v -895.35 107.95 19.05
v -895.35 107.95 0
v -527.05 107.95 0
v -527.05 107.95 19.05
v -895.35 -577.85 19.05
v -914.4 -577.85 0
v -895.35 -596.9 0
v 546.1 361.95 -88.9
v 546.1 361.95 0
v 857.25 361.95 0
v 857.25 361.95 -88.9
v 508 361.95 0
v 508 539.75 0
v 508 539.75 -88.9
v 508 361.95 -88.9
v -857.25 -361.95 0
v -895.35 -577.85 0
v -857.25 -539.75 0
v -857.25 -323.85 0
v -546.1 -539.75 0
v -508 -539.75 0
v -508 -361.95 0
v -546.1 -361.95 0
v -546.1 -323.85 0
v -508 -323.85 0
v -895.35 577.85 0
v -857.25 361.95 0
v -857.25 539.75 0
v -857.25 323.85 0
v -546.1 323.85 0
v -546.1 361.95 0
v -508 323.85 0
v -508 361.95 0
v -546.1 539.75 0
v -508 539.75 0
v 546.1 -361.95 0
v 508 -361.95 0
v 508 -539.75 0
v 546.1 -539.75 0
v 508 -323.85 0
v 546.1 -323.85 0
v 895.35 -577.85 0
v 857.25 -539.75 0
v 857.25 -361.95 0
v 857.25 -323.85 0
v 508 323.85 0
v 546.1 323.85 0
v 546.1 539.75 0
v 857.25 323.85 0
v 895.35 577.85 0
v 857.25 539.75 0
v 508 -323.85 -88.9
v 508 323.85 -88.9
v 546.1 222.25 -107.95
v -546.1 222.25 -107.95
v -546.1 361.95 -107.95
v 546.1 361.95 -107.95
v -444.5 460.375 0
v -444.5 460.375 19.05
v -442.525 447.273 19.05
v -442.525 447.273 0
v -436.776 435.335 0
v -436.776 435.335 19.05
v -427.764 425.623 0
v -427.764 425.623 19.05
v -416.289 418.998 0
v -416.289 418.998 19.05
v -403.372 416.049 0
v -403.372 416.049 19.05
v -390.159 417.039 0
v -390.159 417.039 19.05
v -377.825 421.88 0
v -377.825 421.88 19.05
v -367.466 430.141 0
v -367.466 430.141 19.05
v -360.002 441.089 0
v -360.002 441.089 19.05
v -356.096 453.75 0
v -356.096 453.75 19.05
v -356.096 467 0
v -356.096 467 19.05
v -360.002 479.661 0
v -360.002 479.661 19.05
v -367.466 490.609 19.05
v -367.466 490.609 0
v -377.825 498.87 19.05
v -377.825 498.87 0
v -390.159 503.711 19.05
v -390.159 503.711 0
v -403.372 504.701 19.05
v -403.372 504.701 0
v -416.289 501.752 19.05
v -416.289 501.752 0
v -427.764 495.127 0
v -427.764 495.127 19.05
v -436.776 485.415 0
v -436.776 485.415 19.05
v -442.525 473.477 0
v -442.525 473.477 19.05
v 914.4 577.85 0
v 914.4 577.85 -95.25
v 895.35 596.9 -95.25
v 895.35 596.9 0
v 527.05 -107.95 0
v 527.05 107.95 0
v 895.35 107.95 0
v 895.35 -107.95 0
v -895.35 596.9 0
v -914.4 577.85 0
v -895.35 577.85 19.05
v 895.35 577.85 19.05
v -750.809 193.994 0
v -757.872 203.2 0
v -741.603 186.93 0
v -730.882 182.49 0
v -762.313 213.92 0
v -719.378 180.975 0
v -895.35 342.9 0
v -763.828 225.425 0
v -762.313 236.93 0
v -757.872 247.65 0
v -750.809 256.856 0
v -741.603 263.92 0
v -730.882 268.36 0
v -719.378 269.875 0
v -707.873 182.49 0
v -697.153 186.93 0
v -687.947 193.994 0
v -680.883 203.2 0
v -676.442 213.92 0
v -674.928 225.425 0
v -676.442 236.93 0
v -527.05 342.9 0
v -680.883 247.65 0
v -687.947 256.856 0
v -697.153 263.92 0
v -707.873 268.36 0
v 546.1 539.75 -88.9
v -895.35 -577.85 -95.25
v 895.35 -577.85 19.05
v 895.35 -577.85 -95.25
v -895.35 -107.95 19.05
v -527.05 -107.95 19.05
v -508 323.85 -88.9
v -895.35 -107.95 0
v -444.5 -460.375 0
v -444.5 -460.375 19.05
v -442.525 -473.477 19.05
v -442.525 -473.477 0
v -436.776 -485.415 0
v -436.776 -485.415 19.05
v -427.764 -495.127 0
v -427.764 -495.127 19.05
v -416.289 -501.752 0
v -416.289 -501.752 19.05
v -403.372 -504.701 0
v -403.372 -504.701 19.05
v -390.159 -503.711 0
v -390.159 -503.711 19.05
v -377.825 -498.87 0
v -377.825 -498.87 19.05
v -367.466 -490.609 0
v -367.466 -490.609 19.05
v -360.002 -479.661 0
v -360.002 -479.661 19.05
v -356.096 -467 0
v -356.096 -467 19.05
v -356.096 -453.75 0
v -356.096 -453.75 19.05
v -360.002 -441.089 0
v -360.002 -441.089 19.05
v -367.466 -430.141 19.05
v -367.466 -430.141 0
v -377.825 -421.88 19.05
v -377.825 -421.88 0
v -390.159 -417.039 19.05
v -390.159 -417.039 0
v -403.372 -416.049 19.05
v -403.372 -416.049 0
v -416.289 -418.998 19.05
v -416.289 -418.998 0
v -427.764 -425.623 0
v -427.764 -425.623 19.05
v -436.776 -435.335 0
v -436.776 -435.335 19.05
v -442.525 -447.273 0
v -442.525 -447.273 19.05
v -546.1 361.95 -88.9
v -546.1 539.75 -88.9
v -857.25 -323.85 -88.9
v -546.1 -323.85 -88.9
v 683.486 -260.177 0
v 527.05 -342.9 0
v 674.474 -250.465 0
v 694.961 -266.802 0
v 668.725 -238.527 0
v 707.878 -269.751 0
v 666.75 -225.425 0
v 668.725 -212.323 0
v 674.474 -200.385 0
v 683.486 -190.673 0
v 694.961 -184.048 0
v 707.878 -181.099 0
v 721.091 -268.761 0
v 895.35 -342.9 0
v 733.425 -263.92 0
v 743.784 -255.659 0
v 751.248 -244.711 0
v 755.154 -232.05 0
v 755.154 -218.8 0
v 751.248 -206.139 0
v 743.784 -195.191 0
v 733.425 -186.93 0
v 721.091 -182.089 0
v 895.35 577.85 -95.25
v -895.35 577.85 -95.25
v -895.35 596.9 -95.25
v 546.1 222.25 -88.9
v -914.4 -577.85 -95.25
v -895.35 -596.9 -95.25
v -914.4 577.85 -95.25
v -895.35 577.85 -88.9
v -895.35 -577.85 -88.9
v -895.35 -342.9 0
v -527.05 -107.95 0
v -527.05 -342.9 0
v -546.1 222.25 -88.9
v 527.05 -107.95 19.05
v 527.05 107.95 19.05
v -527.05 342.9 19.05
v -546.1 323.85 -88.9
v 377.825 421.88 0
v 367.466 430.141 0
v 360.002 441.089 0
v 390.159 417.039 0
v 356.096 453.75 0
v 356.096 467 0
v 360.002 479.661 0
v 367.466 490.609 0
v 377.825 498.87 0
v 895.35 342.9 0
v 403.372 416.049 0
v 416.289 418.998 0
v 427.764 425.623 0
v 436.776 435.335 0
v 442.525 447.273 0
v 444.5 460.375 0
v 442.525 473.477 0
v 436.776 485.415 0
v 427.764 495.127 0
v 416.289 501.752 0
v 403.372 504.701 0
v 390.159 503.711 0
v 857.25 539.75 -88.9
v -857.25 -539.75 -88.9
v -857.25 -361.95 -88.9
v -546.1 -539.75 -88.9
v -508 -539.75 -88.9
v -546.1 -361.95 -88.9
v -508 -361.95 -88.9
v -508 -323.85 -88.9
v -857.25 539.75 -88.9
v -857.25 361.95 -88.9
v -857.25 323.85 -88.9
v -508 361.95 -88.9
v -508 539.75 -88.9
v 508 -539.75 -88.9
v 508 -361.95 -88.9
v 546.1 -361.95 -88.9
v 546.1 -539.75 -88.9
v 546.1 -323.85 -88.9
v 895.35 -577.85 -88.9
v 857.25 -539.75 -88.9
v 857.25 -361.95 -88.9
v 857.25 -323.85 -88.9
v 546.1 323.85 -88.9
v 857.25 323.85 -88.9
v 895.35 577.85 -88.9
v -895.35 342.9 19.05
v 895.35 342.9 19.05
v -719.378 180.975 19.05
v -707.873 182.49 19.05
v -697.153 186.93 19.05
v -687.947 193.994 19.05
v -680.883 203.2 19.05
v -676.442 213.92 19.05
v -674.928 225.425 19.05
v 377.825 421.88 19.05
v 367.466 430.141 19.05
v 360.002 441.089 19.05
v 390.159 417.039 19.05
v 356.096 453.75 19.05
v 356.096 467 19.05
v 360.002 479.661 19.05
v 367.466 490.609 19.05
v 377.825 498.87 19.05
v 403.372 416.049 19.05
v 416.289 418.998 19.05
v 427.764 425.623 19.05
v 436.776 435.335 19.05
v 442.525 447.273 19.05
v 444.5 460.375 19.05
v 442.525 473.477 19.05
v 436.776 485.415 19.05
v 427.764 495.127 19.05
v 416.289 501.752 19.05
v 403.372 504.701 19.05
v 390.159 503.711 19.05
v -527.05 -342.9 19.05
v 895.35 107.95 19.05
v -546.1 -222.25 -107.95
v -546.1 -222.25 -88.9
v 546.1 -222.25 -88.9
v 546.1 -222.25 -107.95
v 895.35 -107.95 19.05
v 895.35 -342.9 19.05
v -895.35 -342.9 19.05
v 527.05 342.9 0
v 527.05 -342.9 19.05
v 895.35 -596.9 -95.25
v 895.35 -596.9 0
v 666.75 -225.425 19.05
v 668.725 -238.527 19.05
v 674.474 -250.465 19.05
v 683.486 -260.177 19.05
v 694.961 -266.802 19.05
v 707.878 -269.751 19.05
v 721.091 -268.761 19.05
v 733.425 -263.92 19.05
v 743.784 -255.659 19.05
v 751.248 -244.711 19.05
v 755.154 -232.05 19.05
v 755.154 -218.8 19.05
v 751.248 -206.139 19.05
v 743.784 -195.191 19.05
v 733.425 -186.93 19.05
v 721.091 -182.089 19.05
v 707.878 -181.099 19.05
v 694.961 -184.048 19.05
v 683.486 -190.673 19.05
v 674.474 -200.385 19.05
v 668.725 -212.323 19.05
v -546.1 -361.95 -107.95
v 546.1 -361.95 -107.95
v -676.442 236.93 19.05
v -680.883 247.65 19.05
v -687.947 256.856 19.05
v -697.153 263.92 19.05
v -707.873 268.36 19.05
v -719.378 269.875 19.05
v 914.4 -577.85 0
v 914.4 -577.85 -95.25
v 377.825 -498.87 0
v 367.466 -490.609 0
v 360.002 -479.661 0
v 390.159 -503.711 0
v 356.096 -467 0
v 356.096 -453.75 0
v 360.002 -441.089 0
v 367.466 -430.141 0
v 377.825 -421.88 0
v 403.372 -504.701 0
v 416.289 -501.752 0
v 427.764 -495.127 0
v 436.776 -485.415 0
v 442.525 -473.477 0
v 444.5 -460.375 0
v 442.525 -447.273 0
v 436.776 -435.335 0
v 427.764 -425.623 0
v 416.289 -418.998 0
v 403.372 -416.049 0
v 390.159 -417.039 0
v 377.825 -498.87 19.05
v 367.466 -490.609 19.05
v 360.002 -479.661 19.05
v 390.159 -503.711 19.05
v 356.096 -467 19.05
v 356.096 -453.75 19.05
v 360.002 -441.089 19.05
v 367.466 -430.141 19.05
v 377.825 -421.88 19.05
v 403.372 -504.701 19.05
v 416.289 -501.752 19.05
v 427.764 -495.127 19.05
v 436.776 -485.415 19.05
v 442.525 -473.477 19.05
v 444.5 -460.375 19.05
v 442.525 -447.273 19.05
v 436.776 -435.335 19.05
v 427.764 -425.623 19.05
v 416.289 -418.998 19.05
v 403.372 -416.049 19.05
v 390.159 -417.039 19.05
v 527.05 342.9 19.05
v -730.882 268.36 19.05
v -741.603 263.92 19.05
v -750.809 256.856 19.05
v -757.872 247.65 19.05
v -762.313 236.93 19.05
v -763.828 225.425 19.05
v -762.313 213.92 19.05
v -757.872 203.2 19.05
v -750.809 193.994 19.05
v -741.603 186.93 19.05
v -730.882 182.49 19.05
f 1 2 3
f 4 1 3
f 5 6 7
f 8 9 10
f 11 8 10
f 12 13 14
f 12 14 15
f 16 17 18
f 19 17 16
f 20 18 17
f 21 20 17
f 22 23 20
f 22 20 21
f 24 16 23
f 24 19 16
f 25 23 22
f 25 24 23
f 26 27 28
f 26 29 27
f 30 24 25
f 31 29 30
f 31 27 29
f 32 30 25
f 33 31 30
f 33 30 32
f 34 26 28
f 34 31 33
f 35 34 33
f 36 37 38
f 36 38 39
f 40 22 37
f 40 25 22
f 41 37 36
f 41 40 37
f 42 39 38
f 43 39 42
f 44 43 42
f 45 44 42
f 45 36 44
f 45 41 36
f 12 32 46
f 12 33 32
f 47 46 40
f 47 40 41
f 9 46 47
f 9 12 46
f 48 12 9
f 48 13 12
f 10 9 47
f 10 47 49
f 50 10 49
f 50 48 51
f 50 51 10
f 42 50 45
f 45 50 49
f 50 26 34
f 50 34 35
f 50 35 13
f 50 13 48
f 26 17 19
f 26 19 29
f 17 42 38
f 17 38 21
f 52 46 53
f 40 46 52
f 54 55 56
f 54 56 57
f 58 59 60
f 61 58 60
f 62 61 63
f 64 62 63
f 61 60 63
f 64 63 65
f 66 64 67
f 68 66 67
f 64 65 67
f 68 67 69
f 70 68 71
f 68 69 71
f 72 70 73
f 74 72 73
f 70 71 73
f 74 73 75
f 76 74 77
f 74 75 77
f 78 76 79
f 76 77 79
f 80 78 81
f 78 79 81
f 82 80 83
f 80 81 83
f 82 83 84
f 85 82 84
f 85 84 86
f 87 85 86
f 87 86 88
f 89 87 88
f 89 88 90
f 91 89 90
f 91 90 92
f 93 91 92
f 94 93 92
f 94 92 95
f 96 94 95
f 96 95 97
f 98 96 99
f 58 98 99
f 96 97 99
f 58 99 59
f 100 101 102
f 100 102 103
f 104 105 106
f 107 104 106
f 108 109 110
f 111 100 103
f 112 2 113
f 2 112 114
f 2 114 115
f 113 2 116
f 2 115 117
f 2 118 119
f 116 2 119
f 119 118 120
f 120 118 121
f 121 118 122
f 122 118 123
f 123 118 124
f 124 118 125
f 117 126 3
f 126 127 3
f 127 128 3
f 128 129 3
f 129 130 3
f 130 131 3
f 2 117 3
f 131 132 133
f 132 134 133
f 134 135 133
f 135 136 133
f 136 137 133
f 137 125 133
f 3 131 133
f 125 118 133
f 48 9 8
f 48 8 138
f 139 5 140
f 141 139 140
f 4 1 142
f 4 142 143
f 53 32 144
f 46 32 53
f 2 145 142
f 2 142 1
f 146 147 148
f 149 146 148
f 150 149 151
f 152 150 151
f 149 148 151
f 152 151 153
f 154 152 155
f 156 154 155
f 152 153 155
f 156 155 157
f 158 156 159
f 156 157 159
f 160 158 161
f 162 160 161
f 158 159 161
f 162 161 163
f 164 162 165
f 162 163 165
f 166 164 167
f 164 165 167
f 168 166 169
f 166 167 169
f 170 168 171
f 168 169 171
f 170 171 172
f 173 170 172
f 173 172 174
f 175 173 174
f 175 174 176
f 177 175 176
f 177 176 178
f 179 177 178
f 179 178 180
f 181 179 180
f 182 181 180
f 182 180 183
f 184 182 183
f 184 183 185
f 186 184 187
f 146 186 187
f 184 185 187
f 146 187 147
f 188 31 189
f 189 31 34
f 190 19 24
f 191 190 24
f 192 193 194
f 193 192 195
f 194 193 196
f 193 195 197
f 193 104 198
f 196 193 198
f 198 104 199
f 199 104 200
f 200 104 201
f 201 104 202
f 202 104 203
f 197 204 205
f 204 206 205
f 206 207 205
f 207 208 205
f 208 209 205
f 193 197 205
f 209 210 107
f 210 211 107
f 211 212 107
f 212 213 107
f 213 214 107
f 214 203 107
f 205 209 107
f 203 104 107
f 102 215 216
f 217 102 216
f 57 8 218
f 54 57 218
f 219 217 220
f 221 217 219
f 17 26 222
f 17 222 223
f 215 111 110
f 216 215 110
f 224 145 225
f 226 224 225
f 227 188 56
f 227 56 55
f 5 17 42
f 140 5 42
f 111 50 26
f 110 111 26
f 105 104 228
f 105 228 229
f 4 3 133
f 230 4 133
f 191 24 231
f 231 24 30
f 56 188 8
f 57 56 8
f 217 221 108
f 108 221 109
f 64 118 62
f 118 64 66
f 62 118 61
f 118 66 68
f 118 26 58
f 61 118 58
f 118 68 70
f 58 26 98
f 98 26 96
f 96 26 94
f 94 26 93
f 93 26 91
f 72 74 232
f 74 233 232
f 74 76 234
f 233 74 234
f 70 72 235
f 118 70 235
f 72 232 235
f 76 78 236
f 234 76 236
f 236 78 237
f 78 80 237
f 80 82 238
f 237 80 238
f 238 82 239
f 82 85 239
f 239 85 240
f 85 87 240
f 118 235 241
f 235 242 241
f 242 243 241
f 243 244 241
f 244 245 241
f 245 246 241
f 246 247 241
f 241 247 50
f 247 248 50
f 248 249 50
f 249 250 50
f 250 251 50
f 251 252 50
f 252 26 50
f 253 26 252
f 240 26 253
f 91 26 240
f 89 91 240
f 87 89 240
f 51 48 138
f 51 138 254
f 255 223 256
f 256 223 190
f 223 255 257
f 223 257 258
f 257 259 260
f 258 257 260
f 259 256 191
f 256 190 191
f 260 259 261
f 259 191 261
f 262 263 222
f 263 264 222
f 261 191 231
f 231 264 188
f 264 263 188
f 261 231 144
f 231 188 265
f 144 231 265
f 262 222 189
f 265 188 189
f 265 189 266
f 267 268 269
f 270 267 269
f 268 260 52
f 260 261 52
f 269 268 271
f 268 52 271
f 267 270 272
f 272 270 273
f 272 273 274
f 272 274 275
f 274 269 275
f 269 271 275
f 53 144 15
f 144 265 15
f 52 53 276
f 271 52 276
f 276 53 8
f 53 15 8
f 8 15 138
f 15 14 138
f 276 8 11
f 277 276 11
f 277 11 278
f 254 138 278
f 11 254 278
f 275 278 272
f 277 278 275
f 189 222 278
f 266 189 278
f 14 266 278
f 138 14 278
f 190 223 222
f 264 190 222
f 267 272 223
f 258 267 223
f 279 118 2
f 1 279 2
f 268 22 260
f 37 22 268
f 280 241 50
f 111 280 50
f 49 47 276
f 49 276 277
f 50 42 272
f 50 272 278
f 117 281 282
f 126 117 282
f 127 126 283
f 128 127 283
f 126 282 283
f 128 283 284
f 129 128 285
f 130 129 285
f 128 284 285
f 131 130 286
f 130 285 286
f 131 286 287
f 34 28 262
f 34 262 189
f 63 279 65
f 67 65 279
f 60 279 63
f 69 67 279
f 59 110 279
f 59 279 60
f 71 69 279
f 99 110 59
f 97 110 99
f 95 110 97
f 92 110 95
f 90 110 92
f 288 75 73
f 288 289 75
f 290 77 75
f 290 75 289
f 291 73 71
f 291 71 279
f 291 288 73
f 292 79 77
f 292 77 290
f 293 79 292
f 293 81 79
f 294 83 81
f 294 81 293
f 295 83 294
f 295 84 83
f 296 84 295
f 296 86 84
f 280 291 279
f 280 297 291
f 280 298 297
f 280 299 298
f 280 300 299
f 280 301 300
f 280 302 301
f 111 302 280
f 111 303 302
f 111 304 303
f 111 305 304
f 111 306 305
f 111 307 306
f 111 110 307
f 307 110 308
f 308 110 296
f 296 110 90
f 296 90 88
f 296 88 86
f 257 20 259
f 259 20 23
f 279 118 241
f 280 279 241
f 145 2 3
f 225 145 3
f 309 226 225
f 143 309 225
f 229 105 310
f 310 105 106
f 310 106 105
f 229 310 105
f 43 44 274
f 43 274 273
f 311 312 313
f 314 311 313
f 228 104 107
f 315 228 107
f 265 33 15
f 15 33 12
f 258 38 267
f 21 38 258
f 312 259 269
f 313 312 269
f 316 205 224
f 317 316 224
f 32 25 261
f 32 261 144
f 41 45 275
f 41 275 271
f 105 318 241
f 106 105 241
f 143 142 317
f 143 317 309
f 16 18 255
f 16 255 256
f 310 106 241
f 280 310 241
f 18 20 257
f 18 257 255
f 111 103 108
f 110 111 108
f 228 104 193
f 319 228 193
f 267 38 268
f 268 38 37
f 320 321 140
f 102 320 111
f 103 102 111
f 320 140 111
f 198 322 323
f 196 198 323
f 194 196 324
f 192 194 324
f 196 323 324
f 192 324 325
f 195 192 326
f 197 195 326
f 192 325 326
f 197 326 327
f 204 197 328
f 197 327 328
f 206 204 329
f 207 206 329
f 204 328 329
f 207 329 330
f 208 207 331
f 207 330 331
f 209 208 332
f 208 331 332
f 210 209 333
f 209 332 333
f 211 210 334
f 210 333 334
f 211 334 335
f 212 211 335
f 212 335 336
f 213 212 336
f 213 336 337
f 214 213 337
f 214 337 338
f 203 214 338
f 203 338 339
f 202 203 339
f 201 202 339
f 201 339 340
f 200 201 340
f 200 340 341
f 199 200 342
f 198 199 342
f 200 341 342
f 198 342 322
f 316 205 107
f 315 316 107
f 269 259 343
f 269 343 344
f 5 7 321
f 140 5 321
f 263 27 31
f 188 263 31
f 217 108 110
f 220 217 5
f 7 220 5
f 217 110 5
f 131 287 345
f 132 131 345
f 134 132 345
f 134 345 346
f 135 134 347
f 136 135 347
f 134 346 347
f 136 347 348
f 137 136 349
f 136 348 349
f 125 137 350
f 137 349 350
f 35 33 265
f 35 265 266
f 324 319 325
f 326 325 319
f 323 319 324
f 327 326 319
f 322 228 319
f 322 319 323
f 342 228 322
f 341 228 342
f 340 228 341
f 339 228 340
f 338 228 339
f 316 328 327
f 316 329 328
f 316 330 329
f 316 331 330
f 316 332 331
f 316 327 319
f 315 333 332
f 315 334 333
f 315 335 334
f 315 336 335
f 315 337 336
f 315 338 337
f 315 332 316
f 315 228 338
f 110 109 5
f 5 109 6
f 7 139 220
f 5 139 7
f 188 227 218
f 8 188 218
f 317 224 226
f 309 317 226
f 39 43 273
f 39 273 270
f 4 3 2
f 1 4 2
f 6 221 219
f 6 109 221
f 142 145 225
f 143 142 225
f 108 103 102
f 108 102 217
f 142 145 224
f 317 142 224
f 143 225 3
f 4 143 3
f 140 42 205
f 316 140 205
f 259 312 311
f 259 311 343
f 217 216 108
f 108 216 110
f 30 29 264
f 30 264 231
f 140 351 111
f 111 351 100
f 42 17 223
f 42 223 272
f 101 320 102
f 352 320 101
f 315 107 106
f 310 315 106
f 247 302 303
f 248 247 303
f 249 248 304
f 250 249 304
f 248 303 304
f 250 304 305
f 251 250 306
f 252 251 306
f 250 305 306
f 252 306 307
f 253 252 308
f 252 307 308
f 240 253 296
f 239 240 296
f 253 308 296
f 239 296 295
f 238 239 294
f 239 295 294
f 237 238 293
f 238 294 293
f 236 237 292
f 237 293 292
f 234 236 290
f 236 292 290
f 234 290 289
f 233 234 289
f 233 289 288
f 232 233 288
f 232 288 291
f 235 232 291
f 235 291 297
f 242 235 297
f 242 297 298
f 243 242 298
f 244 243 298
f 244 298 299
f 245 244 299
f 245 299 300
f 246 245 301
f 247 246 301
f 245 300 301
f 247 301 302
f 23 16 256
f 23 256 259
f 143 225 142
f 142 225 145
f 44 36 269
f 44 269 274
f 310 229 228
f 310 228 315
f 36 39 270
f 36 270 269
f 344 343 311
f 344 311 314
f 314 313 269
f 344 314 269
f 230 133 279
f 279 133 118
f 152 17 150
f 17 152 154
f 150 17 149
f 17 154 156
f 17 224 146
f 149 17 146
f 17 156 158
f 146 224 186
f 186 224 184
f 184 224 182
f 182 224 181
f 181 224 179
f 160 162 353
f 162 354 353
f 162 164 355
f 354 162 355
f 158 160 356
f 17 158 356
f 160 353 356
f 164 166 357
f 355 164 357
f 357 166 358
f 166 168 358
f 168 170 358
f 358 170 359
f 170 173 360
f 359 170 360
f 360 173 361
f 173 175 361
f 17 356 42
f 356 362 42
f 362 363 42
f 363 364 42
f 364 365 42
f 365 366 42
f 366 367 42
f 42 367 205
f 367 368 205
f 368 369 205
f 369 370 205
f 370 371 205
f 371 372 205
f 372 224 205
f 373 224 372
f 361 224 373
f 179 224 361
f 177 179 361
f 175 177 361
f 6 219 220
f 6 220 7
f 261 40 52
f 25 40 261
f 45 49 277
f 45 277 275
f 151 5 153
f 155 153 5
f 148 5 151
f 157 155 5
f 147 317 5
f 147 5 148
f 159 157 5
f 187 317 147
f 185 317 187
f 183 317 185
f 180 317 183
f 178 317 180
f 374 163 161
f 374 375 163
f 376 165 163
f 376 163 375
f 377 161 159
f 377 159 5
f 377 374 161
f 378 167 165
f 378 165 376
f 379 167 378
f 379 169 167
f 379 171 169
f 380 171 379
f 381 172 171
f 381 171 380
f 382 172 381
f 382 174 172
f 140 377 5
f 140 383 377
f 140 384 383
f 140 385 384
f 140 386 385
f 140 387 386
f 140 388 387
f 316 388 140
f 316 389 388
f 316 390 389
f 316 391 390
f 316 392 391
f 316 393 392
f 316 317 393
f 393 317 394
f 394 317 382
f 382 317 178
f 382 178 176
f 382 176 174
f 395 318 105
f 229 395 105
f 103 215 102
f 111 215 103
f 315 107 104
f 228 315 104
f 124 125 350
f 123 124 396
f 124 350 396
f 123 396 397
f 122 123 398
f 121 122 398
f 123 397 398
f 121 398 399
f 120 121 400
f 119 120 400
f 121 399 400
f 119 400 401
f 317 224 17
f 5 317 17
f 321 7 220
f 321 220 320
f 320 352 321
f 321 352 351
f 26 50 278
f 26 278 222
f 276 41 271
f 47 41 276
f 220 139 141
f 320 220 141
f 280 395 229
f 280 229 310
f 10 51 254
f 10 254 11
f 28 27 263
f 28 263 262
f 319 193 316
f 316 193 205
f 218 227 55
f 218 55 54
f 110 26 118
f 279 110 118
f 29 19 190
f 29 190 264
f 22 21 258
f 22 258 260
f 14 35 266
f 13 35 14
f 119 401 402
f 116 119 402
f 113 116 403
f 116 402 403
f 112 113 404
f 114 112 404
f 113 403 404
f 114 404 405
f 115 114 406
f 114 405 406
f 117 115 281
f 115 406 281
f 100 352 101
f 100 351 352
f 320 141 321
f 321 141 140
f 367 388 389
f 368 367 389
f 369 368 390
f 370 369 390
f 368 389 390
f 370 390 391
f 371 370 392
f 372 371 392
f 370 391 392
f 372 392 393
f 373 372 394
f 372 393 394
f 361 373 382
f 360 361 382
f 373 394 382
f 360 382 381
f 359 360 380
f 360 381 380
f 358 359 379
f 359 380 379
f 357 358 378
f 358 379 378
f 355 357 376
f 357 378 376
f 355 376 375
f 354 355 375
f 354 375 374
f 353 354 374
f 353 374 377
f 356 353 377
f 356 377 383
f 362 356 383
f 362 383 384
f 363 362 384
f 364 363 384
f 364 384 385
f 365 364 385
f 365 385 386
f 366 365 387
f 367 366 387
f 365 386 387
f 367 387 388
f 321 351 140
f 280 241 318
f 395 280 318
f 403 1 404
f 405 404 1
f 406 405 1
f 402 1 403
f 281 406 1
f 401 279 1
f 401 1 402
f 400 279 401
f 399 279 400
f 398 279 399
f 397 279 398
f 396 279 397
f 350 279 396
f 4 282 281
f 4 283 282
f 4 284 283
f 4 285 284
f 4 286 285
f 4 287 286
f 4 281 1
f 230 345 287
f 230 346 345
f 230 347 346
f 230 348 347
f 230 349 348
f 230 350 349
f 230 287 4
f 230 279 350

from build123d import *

# Parameters (mm, degrees)
F0_W       = 38.1
F0_H       = 38.1
F0_W_2     = 1016
F0_H_2     = 647.7
F0_W_3     = 311.15
F0_H_3     = 177.8
F1_DEPTH   = 88.9
F2_W       = 311.15
F2_H       = 177.8
F2_W_2     = 1016
F3_DEPTH   = 19.05
F2_H_2     = 215.9
F2_W_3     = 38.1
F2_W_4     = 19.05
F4_DEPTH   = 19.05
F5_W       = 1092.2
F5_H       = 139.7
F6_DEPTH   = 19.05
F7_W       = 1790.7
F7_H       = 114.3
F8_DEPTH   = 19.05
F9_W       = 1790.7
F9_H       = 114.3
F10_DEPTH  = 19.05
F11_W      = 1193.8
F11_H      = 114.3
F12_DEPTH  = 19.05
F13_W      = 1193.8
F13_H      = 114.3
F14_DEPTH  = 19.05
F15_SIZE   = 19.04999
F15_2_SIZE = 19.04999
F15_3_SIZE = 19.04999
F15_4_SIZE = 19.04999
F16_R      = 44.45
F17_DEPTH  = 19.05


# Not quite as in the source:
# - a fillet or chamfer is up to 0.001 mm smaller than in the source, because OpenCascade refuses the exact size


with BuildPart() as f1:
    # F0 (on Top) → F1 (new body)
    with BuildSketch(Plane.XY):
        with Locations((527.05, 558.8)):
            Rectangle(F0_W, F0_H)
        with Locations((0, 558.8)):
            Rectangle(F0_W_2, F0_H)
        with Locations((876.3, 0)):
            Rectangle(F0_W, F0_H_2)
        with Locations((876.3, 342.9)):
            Rectangle(F0_W, F0_H)
        with Locations((-876.3, 342.9)):
            Rectangle(F0_W, F0_H)
        with Locations((-876.3, 0)):
            Rectangle(F0_W, F0_H_2)
        with Locations((-527.05, 558.8)):
            Rectangle(F0_W, F0_H)
        with Locations((0, -558.8)):
            Rectangle(F0_W_2, F0_H)
        with Locations((527.05, -558.8)):
            Rectangle(F0_W, F0_H)
        with Locations((876.3, -342.9)):
            Rectangle(F0_W, F0_H)
        Polygon((546.1, 577.85), (546.1, 539.75), (857.25, 539.75), (857.25, 361.95), (895.35, 361.95), (895.35, 577.85), align=None)
        with Locations((-876.3, -342.9)):
            Rectangle(F0_W, F0_H)
        with Locations((-527.05, -558.8)):
            Rectangle(F0_W, F0_H)
        Polygon((-895.35, 361.95), (-857.25, 361.95), (-857.25, 539.75), (-546.1, 539.75), (-546.1, 577.85), (-895.35, 577.85), align=None)
        Polygon((857.25, -539.75), (546.1, -539.75), (546.1, -577.85), (895.35, -577.85), (895.35, -361.95), (857.25, -361.95), align=None)
        Polygon((-857.25, -539.75), (-857.25, -361.95), (-895.35, -361.95), (-895.35, -577.85), (-546.1, -577.85), (-546.1, -539.75), align=None)
        with Locations((-701.675, 342.9)):
            Rectangle(F0_W_3, F0_H)
        with Locations((-527.05, 450.85)):
            Rectangle(F0_W, F0_H_3)
        with Locations((-527.05, 342.9)):
            Rectangle(F0_W, F0_H)
        with Locations((-527.05, 0)):
            Rectangle(F0_W, F0_H_2)
        with Locations((-701.675, -342.9)):
            Rectangle(F0_W_3, F0_H)
        with Locations((-527.05, -450.85)):
            Rectangle(F0_W, F0_H_3)
        with Locations((-527.05, -342.9)):
            Rectangle(F0_W, F0_H)
        with Locations((0, -342.9)):
            Rectangle(F0_W_2, F0_H)
        with Locations((527.05, -450.85)):
            Rectangle(F0_W, F0_H_3)
        with Locations((527.05, -342.9)):
            Rectangle(F0_W, F0_H)
        with Locations((701.675, -342.9)):
            Rectangle(F0_W_3, F0_H)
        with Locations((527.05, 0)):
            Rectangle(F0_W, F0_H_2)
        with Locations((527.05, 342.9)):
            Rectangle(F0_W, F0_H)
        with Locations((527.05, 450.85)):
            Rectangle(F0_W, F0_H_3)
        with Locations((701.675, 342.9)):
            Rectangle(F0_W_3, F0_H)
        with Locations((0, 342.9)):
            Rectangle(F0_W_2, F0_H)
    extrude(amount=-F1_DEPTH)


with BuildPart() as f3:
    # F2 (on face) → F3 (new body)
    with BuildSketch(Plane.XY):
        Polygon((895.35, 577.85), (-895.35, 577.85), (-895.35, 342.9), (-527.05, 342.9), (527.05, 342.9), (895.35, 342.9), align=None)
        with Locations((-701.675, 450.85)):
            Rectangle(F2_W, F2_H, mode=Mode.SUBTRACT)
        with Locations((0, 450.85)):
            Rectangle(F2_W_2, F2_H, mode=Mode.SUBTRACT)
        with Locations((701.675, 450.85)):
            Rectangle(F2_W, F2_H, mode=Mode.SUBTRACT)
        with Locations((-701.675, 450.85)):
            Rectangle(F2_W, F2_H)
        with Locations((0, 450.85)):
            Rectangle(F2_W_2, F2_H)
        with Locations((701.675, 450.85)):
            Rectangle(F2_W, F2_H)
    extrude(amount=F3_DEPTH)


with BuildPart() as f3b:
    # F2 (on face) → F3, piece 2 (new body)
    with BuildSketch(Plane.XY):
        with Locations((701.675, 0)):
            Rectangle(F2_W, F2_H_2)
        with Locations((876.3, 0)):
            Rectangle(F2_W_3, F2_H_2)
        with Locations((536.575, 0)):
            Rectangle(F2_W_4, F2_H_2)
    extrude(amount=F3_DEPTH)


with BuildPart() as f3c:
    # F2 (on face) → F3, piece 3 (new body)
    with BuildSketch(Plane.XY):
        with Locations((-701.675, 0)):
            Rectangle(F2_W, F2_H_2)
        with Locations((-876.3, 0)):
            Rectangle(F2_W_3, F2_H_2)
        with Locations((-536.575, 0)):
            Rectangle(F2_W_4, F2_H_2)
    extrude(amount=F3_DEPTH)


with BuildPart() as f3d:
    # F2 (on face) → F3, piece 4 (new body)
    with BuildSketch(Plane.XY):
        Polygon((-527.05, -342.9), (-895.35, -342.9), (-895.35, -577.85), (895.35, -577.85), (895.35, -342.9), (527.05, -342.9), align=None)
        with Locations((-701.675, -450.85)):
            Rectangle(F2_W, F2_H, mode=Mode.SUBTRACT)
        with Locations((0, -450.85)):
            Rectangle(F2_W_2, F2_H, mode=Mode.SUBTRACT)
        with Locations((701.675, -450.85)):
            Rectangle(F2_W, F2_H, mode=Mode.SUBTRACT)
        with Locations((-701.675, -450.85)):
            Rectangle(F2_W, F2_H)
        with Locations((0, -450.85)):
            Rectangle(F2_W_2, F2_H)
        with Locations((701.675, -450.85)):
            Rectangle(F2_W, F2_H)
    extrude(amount=F3_DEPTH)


with BuildPart() as f4:
    # F2 (on face) → F4 (new body)
    with BuildSketch(Plane.XY):
        with Locations((-701.675, 215.9)):
            Rectangle(F2_W, F2_H_2)
        Polygon((-527.05, 342.9), (-895.35, 342.9), (-895.35, 107.95), (-857.25, 107.95), (-857.25, 323.85), (-546.1, 323.85), (-546.1, 107.95), (-527.05, 107.95), align=None)
    extrude(amount=F4_DEPTH)


with BuildPart() as f4b:
    # F2 (on face) → F4, piece 2 (new body)
    with BuildSketch(Plane.XY):
        Polygon((895.35, 107.95), (895.35, 342.9), (527.05, 342.9), (527.05, 107.95), (546.1, 107.95), (546.1, 323.85), (857.25, 323.85), (857.25, 107.95), align=None)
        with Locations((701.675, 215.9)):
            Rectangle(F2_W, F2_H_2)
    extrude(amount=F4_DEPTH)


with BuildPart() as f4c:
    # F2 (on face) → F4, piece 3 (new body)
    with BuildSketch(Plane.XY):
        Polygon((895.35, -342.9), (895.35, -107.95), (857.25, -107.95), (857.25, -323.85), (546.1, -323.85), (546.1, -107.95), (527.05, -107.95), (527.05, -342.9), align=None)
        with Locations((701.675, -215.9)):
            Rectangle(F2_W, F2_H_2)
    extrude(amount=F4_DEPTH)


with BuildPart() as f4d:
    # F2 (on face) → F4, piece 4 (new body)
    with BuildSketch(Plane.XY):
        Polygon((-857.25, -107.95), (-895.35, -107.95), (-895.35, -342.9), (-527.05, -342.9), (-527.05, -107.95), (-546.1, -107.95), (-546.1, -323.85), (-857.25, -323.85), align=None)
        with Locations((-701.675, -215.9)):
            Rectangle(F2_W, F2_H_2)
    extrude(amount=F4_DEPTH)


with BuildPart() as f6:
    # F5 (on face) → F6 (new body)
    with BuildSketch(Plane(origin=(0, 0, -88.9), x_dir=(1, 0, 0), z_dir=(0, 0, -1))):
        with Locations((0, 292.1)):
            Rectangle(F5_W, F5_H)
    extrude(amount=F6_DEPTH)


with BuildPart() as f6b:
    # F5 (on face) → F6, piece 2 (new body)
    with BuildSketch(Plane(origin=(0, 0, -88.9), x_dir=(1, 0, 0), z_dir=(0, 0, -1))):
        with Locations((0, -292.1)):
            Rectangle(F5_W, F5_H)
    extrude(amount=F6_DEPTH)


with BuildPart() as f8:
    # F7 (on face) → F8 (new body)
    with BuildSketch(Plane.XZ.offset(577.85)):
        with Locations((0, -38.1)):
            Rectangle(F7_W, F7_H)
    extrude(amount=F8_DEPTH)

    # F15#3 (size 19.05 in the source; OpenCascade refuses exactly that, so slightly less here)
    f15_3_edges = [f8.edges().sort_by_distance(p)[0] for p in [
        (0, -596.9, 19.05),
    ]]
    chamfer(f15_3_edges, length=F15_3_SIZE)


with BuildPart() as f10:
    # F9 (on face) → F10 (new body)
    with BuildSketch(Plane(origin=(0, 577.85, 0), x_dir=(-1, 0, 0), z_dir=(0, 1, 0))):
        with Locations((0, -38.1)):
            Rectangle(F9_W, F9_H)
    extrude(amount=F10_DEPTH)

    # F15#2 (size 19.05 in the source; OpenCascade refuses exactly that, so slightly less here)
    f15_2_edges = [f10.edges().sort_by_distance(p)[0] for p in [
        (0, 596.9, 19.05),
    ]]
    chamfer(f15_2_edges, length=F15_2_SIZE)


with BuildPart() as f12:
    # F11 (on face) → F12 (new body)
    with BuildSketch(Plane.YZ.offset(895.35)):
        with Locations((0, -38.1)):
            Rectangle(F11_W, F11_H)
    extrude(amount=F12_DEPTH)

    # F15#4 (size 19.05 in the source; OpenCascade refuses exactly that, so slightly less here)
    f15_4_edges = [f12.edges().sort_by_distance(p)[0] for p in [
        (914.4, 0, 19.05),
        (914.4, -596.9, -38.1),
        (914.4, 596.9, -38.1),
        (904.875, 596.9, 19.05),
        (904.875, -596.9, 19.05),
    ]]
    chamfer(f15_4_edges, length=F15_4_SIZE)


with BuildPart() as f14:
    # F13 (on face) → F14 (new body)
    with BuildSketch(Plane(origin=(-895.35, 0, 0), x_dir=(0, -1, 0), z_dir=(-1, 0, 0))):
        with Locations((0, -38.1)):
            Rectangle(F13_W, F13_H)
    extrude(amount=F14_DEPTH)

    # F15 (size 19.05 in the source; OpenCascade refuses exactly that, so slightly less here)
    f15_edges = [f14.edges().sort_by_distance(p)[0] for p in [
        (-914.4, 0, 19.05),
        (-914.4, 596.9, -38.1),
        (-914.4, -596.9, -38.1),
        (-904.875, -596.9, 19.05),
        (-904.875, 596.9, 19.05),
    ]]
    chamfer(f15_edges, length=F15_SIZE)


with BuildPart() as f17_tool:
    # F16 (on face) → F17 (new body)
    with BuildSketch(Plane.XY.offset(19.05)):
        with BuildLine():
            ThreePointArc((-355.6, 460.375), (-400.05, 504.825), (-444.5, 460.375))
            ThreePointArc((-444.5, 460.375), (-400.05, 415.925), (-355.6, 460.375))
        make_face()
        with Locations((400.05, 460.375)):
            Circle(F16_R)
        with BuildLine():
            ThreePointArc((755.65, -225.425), (711.2, -180.975), (666.75, -225.425))
            Line((666.75, -225.425), (755.65, -225.425))
        make_face()
        with BuildLine():
            Line((755.65, -225.425), (666.75, -225.425))
            ThreePointArc((666.75, -225.425), (711.2, -269.875), (755.65, -225.425))
        make_face()
        with Locations((400.05, -460.375)):
            Circle(F16_R)
        with BuildLine():
            ThreePointArc((-355.6, -460.375), (-400.05, -415.925), (-444.5, -460.375))
            ThreePointArc((-444.5, -460.375), (-400.05, -504.825), (-355.6, -460.375))
        make_face()
        with BuildLine():
            ThreePointArc((-719.3776369095, 180.975), (-687.9467404857, 193.9941035763), (-674.9276369095, 225.425))
            Line((-674.9276369095, 225.425), (-719.3776369095, 225.425))
            Line((-719.3776369095, 225.425), (-719.3776369095, 180.975))
        make_face()
        with BuildLine():
            Line((-719.3776369095, 225.425), (-674.9276369095, 225.425))
            ThreePointArc((-674.9276369095, 225.425), (-687.9467404857, 256.8558964237), (-719.3776369095, 269.875))
            Line((-719.3776369095, 269.875), (-719.3776369095, 225.425))
        make_face()
        with BuildLine():
            Line((-719.3776369095, 180.975), (-719.3776369095, 225.425))
            Line((-719.3776369095, 225.425), (-763.8276369095, 225.425))
            ThreePointArc((-763.8276369095, 225.425), (-750.8085333332, 193.9941035763), (-719.3776369095, 180.975))
        make_face()
        with BuildLine():
            Line((-763.8276369095, 225.425), (-719.3776369095, 225.425))
            Line((-719.3776369095, 225.425), (-719.3776369095, 269.875))
            ThreePointArc((-719.3776369095, 269.875), (-750.8085333332, 256.8558964237), (-763.8276369095, 225.425))
        make_face()
    extrude(amount=-F17_DEPTH)


with BuildPart() as f3_1:
    add(f3.part)

    # F17: cut by f17_tool
    add(f17_tool.part, mode=Mode.SUBTRACT)


with BuildPart() as f3d_1:
    add(f3d.part)

    # F17: cut by f17_tool
    add(f17_tool.part, mode=Mode.SUBTRACT)


with BuildPart() as f4_1:
    add(f4.part)

    # F17: cut by f17_tool
    add(f17_tool.part, mode=Mode.SUBTRACT)


with BuildPart() as f4c_1:
    add(f4c.part)

    # F17: cut by f17_tool
    add(f17_tool.part, mode=Mode.SUBTRACT)


solid = Compound([f1.part, f3b.part, f3c.part, f4b.part, f4d.part, f6.part, f6b.part, f8.part, f10.part, f12.part, f14.part, f3_1.part, f3d_1.part, f4_1.part, f4c_1.part])
